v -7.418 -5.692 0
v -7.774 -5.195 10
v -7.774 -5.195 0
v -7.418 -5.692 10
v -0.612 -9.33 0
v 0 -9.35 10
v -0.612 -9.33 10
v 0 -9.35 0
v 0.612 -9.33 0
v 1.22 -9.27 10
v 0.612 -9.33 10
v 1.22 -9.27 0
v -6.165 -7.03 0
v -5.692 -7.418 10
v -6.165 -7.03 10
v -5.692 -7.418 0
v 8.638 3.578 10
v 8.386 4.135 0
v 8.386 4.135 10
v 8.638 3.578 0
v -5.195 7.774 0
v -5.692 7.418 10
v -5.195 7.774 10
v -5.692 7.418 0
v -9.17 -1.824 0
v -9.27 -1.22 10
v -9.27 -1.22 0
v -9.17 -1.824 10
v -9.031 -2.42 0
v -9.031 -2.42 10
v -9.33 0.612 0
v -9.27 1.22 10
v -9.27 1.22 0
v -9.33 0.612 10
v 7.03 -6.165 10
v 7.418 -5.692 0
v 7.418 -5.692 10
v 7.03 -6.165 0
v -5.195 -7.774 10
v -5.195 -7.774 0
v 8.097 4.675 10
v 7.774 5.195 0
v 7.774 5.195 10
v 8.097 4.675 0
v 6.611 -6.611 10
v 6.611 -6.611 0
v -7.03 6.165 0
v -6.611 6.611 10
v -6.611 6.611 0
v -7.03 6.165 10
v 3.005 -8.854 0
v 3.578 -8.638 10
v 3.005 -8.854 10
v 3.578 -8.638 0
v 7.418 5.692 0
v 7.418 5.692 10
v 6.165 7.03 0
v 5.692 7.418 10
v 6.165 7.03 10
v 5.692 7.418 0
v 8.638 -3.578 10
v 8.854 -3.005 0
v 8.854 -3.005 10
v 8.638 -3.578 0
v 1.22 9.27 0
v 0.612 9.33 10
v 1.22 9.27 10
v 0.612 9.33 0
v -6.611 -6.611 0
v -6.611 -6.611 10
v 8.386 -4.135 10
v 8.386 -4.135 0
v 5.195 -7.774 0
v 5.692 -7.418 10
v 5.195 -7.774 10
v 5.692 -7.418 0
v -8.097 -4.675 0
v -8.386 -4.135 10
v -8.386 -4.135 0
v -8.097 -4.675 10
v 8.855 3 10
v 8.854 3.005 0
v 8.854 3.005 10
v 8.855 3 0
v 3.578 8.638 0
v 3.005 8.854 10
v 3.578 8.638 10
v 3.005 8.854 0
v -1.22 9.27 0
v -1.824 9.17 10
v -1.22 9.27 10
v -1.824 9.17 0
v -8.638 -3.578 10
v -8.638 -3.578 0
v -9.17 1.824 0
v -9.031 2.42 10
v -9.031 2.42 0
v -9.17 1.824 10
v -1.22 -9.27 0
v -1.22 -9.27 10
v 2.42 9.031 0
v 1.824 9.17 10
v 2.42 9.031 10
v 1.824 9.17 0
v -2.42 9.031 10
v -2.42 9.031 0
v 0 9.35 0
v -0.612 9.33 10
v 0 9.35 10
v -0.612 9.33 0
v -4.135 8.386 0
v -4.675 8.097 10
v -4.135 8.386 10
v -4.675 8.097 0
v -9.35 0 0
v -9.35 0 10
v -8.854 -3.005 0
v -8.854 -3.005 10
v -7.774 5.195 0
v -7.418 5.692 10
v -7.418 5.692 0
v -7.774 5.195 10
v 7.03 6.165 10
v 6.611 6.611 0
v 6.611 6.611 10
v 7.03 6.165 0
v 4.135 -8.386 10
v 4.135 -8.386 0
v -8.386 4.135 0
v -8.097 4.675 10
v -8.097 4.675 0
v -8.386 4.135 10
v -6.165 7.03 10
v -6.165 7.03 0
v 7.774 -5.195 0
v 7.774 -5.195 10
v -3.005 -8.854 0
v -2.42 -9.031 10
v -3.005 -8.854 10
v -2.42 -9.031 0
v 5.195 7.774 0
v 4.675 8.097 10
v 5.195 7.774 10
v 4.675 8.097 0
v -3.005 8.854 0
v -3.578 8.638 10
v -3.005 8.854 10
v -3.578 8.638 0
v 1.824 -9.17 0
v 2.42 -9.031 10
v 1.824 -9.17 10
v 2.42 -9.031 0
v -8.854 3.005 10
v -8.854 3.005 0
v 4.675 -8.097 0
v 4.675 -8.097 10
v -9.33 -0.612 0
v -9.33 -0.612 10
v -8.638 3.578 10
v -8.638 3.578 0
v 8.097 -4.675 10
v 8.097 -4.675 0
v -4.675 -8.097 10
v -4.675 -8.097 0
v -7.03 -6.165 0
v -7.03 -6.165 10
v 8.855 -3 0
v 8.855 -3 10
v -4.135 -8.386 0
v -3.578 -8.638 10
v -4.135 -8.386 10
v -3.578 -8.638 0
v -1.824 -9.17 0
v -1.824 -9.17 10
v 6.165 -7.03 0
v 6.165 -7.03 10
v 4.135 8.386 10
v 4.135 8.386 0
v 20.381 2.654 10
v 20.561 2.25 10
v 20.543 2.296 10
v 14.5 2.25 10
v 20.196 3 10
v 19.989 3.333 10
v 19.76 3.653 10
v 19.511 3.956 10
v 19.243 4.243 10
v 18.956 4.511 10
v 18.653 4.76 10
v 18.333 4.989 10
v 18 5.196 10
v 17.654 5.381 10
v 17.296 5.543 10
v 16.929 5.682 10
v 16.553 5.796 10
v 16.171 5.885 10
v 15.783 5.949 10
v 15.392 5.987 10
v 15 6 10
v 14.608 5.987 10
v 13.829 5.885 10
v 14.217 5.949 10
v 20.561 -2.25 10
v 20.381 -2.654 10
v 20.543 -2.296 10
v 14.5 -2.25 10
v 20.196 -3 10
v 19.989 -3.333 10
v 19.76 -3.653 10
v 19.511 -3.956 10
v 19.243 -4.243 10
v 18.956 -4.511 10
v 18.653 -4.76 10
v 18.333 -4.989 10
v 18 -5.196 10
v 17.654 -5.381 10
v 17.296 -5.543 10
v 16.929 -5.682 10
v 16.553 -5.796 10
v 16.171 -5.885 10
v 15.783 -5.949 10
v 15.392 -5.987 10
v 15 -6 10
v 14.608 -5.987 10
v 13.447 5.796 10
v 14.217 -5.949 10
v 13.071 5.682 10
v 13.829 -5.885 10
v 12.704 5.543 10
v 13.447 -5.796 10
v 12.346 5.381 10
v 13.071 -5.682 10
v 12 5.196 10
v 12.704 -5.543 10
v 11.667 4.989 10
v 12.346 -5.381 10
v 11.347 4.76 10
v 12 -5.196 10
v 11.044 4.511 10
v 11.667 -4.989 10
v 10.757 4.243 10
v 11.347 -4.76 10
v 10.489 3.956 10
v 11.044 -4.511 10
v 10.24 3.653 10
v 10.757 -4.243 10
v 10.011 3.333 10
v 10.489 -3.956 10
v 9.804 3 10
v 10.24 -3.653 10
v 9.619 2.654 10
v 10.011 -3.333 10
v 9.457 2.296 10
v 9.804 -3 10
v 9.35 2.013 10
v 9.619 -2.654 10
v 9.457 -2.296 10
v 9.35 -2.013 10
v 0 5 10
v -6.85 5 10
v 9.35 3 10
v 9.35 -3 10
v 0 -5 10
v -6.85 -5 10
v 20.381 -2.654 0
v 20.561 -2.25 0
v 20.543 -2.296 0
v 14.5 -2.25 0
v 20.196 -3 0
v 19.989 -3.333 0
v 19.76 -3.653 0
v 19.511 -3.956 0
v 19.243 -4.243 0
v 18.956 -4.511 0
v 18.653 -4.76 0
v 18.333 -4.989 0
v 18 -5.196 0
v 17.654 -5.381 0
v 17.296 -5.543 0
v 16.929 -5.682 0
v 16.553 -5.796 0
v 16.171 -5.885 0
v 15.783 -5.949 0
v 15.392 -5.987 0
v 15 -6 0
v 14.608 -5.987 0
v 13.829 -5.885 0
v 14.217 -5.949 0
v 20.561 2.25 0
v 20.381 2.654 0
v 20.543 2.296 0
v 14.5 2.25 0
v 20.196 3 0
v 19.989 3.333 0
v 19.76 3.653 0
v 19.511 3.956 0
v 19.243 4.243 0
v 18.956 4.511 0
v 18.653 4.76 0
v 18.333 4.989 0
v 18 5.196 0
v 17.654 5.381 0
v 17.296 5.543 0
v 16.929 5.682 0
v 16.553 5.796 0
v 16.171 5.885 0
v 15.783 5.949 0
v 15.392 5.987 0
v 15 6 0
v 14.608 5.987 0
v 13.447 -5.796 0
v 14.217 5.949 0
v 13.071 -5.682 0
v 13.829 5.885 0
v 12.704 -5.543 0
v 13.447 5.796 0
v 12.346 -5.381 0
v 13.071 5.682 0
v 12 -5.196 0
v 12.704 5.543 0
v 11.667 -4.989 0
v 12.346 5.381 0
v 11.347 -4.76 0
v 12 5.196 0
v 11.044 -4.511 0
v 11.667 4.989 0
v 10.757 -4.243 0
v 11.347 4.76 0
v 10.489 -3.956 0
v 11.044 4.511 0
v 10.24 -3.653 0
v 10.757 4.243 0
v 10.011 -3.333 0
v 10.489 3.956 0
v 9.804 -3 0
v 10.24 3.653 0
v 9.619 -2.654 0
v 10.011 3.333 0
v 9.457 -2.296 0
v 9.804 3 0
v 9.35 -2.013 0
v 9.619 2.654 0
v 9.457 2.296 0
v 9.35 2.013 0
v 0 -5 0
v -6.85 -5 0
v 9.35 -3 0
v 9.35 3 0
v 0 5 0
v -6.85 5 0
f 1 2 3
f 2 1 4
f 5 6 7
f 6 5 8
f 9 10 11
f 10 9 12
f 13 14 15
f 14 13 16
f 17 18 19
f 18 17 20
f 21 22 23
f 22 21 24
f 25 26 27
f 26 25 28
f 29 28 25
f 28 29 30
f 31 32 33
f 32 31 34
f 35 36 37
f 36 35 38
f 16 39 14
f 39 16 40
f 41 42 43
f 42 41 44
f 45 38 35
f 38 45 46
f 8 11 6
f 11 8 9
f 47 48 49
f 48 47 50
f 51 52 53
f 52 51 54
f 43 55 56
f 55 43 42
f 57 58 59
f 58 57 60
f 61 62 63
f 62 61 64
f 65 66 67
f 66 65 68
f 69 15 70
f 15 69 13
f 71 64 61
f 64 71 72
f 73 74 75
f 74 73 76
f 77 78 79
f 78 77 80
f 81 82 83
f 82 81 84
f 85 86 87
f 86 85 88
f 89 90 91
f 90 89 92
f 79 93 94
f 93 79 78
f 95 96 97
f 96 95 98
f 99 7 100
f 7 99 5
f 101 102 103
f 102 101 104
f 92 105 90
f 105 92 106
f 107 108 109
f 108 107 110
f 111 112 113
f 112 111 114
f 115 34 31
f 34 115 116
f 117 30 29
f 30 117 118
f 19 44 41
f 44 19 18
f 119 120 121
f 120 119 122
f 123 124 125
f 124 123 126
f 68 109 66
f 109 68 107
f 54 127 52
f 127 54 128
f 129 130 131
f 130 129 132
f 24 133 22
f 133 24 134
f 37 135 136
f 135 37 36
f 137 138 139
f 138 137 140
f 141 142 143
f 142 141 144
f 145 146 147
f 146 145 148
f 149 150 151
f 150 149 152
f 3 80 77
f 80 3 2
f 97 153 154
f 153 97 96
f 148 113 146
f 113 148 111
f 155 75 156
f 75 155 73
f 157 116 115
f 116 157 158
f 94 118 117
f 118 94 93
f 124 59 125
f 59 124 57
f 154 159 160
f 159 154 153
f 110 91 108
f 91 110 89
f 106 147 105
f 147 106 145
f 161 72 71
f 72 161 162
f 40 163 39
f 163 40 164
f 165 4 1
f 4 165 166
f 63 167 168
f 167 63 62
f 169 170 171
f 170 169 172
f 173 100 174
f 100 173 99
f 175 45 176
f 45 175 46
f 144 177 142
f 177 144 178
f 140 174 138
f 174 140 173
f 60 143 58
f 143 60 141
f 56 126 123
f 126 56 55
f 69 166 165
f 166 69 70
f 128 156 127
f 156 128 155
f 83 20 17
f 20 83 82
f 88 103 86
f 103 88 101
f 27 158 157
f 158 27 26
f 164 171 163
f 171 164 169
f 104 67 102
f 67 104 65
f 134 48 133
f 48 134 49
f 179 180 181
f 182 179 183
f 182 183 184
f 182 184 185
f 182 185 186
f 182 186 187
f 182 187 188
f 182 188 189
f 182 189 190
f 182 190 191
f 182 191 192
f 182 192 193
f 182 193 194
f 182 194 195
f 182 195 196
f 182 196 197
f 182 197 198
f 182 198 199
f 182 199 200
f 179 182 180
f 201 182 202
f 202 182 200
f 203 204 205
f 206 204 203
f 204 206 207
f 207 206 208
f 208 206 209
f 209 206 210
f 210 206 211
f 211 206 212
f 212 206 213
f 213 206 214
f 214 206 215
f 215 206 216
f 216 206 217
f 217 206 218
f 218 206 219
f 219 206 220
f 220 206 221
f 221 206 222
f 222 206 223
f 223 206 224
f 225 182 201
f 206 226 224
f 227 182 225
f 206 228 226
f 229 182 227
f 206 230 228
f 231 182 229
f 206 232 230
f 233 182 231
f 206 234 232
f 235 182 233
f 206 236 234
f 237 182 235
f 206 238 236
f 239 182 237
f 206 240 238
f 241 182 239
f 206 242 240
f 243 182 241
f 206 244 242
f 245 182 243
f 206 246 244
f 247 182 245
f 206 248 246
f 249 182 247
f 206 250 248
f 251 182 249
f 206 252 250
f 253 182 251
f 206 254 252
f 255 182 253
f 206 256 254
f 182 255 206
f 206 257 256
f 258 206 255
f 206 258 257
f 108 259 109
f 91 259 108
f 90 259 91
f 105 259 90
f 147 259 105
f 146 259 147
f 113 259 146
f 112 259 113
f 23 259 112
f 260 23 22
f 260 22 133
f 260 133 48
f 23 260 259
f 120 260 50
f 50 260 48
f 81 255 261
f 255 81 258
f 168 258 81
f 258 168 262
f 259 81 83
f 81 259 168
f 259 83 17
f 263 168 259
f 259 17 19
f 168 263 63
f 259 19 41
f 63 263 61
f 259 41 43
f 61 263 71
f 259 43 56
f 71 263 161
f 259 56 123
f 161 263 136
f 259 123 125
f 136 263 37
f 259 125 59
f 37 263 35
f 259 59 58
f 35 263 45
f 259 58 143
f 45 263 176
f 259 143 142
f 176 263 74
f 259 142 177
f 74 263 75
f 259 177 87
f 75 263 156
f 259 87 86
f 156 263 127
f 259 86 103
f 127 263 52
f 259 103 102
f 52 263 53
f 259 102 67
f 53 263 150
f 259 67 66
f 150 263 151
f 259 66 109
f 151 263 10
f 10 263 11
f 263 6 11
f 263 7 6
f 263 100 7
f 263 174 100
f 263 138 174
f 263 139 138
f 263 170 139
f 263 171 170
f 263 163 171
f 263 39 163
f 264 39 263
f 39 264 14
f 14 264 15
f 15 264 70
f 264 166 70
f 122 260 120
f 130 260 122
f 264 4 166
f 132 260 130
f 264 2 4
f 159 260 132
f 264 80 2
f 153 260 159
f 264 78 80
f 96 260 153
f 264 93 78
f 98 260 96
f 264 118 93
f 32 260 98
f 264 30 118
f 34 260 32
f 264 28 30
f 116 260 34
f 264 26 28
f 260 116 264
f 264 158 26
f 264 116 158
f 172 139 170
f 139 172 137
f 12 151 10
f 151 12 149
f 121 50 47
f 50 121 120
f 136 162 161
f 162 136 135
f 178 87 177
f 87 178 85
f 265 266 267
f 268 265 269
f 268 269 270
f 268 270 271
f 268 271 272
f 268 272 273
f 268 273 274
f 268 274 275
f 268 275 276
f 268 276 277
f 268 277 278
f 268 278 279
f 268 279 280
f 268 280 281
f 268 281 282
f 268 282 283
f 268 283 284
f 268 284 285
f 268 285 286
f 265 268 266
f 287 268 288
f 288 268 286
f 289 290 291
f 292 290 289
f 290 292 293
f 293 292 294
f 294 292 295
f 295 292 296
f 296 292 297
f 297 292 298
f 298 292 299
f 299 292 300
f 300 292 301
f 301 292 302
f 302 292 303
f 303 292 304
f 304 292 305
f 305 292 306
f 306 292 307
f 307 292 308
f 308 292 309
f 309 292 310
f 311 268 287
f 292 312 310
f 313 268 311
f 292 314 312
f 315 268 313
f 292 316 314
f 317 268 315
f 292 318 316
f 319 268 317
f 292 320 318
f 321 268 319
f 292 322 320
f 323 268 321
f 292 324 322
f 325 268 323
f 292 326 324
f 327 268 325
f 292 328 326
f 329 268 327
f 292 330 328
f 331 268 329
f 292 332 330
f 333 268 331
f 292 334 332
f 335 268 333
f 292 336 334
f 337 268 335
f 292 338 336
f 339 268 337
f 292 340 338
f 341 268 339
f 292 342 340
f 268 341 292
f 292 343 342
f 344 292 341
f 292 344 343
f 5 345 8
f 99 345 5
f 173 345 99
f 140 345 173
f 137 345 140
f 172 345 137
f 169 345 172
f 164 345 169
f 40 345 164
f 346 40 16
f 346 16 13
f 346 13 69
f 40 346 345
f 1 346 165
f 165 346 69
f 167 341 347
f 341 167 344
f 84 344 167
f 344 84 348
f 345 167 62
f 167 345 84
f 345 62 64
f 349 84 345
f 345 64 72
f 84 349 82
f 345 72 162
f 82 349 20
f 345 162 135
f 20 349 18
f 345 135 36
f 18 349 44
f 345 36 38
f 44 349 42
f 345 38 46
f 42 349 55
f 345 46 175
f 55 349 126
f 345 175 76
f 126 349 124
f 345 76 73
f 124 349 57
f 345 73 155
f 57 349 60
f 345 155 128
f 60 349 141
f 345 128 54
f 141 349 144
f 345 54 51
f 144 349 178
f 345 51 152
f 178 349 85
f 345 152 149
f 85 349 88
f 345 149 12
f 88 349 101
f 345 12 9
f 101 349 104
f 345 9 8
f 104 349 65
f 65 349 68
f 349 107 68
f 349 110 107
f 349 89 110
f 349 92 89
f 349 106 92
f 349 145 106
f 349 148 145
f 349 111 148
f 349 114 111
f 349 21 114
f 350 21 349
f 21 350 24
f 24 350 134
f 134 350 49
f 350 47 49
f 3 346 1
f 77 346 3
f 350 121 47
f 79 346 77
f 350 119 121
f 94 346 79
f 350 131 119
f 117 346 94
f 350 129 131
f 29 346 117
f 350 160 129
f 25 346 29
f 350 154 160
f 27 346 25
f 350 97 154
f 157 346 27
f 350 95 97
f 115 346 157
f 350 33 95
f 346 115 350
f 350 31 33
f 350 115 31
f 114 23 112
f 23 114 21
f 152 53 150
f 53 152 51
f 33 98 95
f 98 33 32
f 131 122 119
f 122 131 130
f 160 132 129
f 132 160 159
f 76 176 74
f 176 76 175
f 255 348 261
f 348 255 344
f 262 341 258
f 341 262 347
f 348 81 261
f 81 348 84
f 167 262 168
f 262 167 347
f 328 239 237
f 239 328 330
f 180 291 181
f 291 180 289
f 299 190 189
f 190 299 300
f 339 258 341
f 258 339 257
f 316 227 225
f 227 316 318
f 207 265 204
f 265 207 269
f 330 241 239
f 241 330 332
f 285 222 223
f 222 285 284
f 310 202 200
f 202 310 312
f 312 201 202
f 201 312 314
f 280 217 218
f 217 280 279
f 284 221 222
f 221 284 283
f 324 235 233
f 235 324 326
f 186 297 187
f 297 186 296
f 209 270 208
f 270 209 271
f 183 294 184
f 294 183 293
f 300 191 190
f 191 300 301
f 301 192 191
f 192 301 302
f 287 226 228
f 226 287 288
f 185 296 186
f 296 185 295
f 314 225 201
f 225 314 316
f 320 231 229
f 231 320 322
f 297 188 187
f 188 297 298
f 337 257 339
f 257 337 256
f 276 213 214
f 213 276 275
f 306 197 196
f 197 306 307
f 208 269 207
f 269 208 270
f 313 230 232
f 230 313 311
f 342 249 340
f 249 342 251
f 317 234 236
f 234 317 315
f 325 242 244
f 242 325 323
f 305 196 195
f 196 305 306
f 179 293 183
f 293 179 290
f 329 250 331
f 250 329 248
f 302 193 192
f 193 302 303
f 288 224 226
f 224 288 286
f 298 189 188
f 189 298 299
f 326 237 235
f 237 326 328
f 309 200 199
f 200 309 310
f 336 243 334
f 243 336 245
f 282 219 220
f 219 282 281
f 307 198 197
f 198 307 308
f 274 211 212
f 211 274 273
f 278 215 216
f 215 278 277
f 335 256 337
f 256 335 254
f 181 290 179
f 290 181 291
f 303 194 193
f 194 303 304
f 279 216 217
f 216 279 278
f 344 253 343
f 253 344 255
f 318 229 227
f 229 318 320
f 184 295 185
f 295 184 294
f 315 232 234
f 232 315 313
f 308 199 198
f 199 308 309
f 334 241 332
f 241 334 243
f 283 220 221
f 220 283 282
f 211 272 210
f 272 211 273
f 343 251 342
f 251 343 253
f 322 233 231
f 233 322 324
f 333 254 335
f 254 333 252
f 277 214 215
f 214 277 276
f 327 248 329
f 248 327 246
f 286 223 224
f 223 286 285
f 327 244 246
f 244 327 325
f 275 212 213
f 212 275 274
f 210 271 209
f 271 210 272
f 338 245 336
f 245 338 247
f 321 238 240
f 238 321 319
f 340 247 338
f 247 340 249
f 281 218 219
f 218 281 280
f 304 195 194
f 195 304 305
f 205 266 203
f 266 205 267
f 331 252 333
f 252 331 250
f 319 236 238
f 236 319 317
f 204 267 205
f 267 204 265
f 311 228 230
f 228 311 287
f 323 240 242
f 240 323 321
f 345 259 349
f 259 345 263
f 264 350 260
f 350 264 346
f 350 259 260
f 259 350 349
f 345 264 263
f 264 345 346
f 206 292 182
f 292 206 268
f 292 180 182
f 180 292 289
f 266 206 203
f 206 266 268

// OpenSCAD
// Snap-on clip holding tubing next to a 12.7 mm lab stand rod
// Print orientation: flat on bed, extruded upward in +Z

// ---------- Parameters ----------
stand_d      = 12.7;   // stand rod diameter
wall         = 3;      // stand rod ring wall thickness
bridge_w     = 6;      // bridge width (Y) between rings
tub_d        = 6;      // tubing hole diameter
tub_x        = 15;     // tubing hole centre X
eps          = 0.5;    // cutter overshoot past faces
h            = 10;     // extrusion height (Z)

$fn = 96;

// ---------- Model ----------
difference() {
    union() {
        // Stand rod ring
        cylinder(d = stand_d + 2 * wall, h = h);
        // Bridge (overlaps ring solid, does not block the hole)
        translate([stand_d / 2 - bridge_w / 2, -bridge_w / 2, 0])
            cube([bridge_w, bridge_w, h]);
        // Tubing hole ring
        translate([tub_x, 0, 0])
            cylinder(d = tub_d + 2 * wall, h = h);
    }
    // Stand rod opening (x < 0, -5 < y < 5)
    translate([-stand_d / 2 - eps, -5, 0])
        cube([stand_d / 2 + eps, 10, h + 2 * eps]);
    // Tubing hole opening (x > 15, -2.25 < y < 2.25)
    translate([tub_x - eps, -2.25, 0])
        cube([eps + (tub_d + 2 * wall) / 2, 4.5, h + 2 * eps]);
}
